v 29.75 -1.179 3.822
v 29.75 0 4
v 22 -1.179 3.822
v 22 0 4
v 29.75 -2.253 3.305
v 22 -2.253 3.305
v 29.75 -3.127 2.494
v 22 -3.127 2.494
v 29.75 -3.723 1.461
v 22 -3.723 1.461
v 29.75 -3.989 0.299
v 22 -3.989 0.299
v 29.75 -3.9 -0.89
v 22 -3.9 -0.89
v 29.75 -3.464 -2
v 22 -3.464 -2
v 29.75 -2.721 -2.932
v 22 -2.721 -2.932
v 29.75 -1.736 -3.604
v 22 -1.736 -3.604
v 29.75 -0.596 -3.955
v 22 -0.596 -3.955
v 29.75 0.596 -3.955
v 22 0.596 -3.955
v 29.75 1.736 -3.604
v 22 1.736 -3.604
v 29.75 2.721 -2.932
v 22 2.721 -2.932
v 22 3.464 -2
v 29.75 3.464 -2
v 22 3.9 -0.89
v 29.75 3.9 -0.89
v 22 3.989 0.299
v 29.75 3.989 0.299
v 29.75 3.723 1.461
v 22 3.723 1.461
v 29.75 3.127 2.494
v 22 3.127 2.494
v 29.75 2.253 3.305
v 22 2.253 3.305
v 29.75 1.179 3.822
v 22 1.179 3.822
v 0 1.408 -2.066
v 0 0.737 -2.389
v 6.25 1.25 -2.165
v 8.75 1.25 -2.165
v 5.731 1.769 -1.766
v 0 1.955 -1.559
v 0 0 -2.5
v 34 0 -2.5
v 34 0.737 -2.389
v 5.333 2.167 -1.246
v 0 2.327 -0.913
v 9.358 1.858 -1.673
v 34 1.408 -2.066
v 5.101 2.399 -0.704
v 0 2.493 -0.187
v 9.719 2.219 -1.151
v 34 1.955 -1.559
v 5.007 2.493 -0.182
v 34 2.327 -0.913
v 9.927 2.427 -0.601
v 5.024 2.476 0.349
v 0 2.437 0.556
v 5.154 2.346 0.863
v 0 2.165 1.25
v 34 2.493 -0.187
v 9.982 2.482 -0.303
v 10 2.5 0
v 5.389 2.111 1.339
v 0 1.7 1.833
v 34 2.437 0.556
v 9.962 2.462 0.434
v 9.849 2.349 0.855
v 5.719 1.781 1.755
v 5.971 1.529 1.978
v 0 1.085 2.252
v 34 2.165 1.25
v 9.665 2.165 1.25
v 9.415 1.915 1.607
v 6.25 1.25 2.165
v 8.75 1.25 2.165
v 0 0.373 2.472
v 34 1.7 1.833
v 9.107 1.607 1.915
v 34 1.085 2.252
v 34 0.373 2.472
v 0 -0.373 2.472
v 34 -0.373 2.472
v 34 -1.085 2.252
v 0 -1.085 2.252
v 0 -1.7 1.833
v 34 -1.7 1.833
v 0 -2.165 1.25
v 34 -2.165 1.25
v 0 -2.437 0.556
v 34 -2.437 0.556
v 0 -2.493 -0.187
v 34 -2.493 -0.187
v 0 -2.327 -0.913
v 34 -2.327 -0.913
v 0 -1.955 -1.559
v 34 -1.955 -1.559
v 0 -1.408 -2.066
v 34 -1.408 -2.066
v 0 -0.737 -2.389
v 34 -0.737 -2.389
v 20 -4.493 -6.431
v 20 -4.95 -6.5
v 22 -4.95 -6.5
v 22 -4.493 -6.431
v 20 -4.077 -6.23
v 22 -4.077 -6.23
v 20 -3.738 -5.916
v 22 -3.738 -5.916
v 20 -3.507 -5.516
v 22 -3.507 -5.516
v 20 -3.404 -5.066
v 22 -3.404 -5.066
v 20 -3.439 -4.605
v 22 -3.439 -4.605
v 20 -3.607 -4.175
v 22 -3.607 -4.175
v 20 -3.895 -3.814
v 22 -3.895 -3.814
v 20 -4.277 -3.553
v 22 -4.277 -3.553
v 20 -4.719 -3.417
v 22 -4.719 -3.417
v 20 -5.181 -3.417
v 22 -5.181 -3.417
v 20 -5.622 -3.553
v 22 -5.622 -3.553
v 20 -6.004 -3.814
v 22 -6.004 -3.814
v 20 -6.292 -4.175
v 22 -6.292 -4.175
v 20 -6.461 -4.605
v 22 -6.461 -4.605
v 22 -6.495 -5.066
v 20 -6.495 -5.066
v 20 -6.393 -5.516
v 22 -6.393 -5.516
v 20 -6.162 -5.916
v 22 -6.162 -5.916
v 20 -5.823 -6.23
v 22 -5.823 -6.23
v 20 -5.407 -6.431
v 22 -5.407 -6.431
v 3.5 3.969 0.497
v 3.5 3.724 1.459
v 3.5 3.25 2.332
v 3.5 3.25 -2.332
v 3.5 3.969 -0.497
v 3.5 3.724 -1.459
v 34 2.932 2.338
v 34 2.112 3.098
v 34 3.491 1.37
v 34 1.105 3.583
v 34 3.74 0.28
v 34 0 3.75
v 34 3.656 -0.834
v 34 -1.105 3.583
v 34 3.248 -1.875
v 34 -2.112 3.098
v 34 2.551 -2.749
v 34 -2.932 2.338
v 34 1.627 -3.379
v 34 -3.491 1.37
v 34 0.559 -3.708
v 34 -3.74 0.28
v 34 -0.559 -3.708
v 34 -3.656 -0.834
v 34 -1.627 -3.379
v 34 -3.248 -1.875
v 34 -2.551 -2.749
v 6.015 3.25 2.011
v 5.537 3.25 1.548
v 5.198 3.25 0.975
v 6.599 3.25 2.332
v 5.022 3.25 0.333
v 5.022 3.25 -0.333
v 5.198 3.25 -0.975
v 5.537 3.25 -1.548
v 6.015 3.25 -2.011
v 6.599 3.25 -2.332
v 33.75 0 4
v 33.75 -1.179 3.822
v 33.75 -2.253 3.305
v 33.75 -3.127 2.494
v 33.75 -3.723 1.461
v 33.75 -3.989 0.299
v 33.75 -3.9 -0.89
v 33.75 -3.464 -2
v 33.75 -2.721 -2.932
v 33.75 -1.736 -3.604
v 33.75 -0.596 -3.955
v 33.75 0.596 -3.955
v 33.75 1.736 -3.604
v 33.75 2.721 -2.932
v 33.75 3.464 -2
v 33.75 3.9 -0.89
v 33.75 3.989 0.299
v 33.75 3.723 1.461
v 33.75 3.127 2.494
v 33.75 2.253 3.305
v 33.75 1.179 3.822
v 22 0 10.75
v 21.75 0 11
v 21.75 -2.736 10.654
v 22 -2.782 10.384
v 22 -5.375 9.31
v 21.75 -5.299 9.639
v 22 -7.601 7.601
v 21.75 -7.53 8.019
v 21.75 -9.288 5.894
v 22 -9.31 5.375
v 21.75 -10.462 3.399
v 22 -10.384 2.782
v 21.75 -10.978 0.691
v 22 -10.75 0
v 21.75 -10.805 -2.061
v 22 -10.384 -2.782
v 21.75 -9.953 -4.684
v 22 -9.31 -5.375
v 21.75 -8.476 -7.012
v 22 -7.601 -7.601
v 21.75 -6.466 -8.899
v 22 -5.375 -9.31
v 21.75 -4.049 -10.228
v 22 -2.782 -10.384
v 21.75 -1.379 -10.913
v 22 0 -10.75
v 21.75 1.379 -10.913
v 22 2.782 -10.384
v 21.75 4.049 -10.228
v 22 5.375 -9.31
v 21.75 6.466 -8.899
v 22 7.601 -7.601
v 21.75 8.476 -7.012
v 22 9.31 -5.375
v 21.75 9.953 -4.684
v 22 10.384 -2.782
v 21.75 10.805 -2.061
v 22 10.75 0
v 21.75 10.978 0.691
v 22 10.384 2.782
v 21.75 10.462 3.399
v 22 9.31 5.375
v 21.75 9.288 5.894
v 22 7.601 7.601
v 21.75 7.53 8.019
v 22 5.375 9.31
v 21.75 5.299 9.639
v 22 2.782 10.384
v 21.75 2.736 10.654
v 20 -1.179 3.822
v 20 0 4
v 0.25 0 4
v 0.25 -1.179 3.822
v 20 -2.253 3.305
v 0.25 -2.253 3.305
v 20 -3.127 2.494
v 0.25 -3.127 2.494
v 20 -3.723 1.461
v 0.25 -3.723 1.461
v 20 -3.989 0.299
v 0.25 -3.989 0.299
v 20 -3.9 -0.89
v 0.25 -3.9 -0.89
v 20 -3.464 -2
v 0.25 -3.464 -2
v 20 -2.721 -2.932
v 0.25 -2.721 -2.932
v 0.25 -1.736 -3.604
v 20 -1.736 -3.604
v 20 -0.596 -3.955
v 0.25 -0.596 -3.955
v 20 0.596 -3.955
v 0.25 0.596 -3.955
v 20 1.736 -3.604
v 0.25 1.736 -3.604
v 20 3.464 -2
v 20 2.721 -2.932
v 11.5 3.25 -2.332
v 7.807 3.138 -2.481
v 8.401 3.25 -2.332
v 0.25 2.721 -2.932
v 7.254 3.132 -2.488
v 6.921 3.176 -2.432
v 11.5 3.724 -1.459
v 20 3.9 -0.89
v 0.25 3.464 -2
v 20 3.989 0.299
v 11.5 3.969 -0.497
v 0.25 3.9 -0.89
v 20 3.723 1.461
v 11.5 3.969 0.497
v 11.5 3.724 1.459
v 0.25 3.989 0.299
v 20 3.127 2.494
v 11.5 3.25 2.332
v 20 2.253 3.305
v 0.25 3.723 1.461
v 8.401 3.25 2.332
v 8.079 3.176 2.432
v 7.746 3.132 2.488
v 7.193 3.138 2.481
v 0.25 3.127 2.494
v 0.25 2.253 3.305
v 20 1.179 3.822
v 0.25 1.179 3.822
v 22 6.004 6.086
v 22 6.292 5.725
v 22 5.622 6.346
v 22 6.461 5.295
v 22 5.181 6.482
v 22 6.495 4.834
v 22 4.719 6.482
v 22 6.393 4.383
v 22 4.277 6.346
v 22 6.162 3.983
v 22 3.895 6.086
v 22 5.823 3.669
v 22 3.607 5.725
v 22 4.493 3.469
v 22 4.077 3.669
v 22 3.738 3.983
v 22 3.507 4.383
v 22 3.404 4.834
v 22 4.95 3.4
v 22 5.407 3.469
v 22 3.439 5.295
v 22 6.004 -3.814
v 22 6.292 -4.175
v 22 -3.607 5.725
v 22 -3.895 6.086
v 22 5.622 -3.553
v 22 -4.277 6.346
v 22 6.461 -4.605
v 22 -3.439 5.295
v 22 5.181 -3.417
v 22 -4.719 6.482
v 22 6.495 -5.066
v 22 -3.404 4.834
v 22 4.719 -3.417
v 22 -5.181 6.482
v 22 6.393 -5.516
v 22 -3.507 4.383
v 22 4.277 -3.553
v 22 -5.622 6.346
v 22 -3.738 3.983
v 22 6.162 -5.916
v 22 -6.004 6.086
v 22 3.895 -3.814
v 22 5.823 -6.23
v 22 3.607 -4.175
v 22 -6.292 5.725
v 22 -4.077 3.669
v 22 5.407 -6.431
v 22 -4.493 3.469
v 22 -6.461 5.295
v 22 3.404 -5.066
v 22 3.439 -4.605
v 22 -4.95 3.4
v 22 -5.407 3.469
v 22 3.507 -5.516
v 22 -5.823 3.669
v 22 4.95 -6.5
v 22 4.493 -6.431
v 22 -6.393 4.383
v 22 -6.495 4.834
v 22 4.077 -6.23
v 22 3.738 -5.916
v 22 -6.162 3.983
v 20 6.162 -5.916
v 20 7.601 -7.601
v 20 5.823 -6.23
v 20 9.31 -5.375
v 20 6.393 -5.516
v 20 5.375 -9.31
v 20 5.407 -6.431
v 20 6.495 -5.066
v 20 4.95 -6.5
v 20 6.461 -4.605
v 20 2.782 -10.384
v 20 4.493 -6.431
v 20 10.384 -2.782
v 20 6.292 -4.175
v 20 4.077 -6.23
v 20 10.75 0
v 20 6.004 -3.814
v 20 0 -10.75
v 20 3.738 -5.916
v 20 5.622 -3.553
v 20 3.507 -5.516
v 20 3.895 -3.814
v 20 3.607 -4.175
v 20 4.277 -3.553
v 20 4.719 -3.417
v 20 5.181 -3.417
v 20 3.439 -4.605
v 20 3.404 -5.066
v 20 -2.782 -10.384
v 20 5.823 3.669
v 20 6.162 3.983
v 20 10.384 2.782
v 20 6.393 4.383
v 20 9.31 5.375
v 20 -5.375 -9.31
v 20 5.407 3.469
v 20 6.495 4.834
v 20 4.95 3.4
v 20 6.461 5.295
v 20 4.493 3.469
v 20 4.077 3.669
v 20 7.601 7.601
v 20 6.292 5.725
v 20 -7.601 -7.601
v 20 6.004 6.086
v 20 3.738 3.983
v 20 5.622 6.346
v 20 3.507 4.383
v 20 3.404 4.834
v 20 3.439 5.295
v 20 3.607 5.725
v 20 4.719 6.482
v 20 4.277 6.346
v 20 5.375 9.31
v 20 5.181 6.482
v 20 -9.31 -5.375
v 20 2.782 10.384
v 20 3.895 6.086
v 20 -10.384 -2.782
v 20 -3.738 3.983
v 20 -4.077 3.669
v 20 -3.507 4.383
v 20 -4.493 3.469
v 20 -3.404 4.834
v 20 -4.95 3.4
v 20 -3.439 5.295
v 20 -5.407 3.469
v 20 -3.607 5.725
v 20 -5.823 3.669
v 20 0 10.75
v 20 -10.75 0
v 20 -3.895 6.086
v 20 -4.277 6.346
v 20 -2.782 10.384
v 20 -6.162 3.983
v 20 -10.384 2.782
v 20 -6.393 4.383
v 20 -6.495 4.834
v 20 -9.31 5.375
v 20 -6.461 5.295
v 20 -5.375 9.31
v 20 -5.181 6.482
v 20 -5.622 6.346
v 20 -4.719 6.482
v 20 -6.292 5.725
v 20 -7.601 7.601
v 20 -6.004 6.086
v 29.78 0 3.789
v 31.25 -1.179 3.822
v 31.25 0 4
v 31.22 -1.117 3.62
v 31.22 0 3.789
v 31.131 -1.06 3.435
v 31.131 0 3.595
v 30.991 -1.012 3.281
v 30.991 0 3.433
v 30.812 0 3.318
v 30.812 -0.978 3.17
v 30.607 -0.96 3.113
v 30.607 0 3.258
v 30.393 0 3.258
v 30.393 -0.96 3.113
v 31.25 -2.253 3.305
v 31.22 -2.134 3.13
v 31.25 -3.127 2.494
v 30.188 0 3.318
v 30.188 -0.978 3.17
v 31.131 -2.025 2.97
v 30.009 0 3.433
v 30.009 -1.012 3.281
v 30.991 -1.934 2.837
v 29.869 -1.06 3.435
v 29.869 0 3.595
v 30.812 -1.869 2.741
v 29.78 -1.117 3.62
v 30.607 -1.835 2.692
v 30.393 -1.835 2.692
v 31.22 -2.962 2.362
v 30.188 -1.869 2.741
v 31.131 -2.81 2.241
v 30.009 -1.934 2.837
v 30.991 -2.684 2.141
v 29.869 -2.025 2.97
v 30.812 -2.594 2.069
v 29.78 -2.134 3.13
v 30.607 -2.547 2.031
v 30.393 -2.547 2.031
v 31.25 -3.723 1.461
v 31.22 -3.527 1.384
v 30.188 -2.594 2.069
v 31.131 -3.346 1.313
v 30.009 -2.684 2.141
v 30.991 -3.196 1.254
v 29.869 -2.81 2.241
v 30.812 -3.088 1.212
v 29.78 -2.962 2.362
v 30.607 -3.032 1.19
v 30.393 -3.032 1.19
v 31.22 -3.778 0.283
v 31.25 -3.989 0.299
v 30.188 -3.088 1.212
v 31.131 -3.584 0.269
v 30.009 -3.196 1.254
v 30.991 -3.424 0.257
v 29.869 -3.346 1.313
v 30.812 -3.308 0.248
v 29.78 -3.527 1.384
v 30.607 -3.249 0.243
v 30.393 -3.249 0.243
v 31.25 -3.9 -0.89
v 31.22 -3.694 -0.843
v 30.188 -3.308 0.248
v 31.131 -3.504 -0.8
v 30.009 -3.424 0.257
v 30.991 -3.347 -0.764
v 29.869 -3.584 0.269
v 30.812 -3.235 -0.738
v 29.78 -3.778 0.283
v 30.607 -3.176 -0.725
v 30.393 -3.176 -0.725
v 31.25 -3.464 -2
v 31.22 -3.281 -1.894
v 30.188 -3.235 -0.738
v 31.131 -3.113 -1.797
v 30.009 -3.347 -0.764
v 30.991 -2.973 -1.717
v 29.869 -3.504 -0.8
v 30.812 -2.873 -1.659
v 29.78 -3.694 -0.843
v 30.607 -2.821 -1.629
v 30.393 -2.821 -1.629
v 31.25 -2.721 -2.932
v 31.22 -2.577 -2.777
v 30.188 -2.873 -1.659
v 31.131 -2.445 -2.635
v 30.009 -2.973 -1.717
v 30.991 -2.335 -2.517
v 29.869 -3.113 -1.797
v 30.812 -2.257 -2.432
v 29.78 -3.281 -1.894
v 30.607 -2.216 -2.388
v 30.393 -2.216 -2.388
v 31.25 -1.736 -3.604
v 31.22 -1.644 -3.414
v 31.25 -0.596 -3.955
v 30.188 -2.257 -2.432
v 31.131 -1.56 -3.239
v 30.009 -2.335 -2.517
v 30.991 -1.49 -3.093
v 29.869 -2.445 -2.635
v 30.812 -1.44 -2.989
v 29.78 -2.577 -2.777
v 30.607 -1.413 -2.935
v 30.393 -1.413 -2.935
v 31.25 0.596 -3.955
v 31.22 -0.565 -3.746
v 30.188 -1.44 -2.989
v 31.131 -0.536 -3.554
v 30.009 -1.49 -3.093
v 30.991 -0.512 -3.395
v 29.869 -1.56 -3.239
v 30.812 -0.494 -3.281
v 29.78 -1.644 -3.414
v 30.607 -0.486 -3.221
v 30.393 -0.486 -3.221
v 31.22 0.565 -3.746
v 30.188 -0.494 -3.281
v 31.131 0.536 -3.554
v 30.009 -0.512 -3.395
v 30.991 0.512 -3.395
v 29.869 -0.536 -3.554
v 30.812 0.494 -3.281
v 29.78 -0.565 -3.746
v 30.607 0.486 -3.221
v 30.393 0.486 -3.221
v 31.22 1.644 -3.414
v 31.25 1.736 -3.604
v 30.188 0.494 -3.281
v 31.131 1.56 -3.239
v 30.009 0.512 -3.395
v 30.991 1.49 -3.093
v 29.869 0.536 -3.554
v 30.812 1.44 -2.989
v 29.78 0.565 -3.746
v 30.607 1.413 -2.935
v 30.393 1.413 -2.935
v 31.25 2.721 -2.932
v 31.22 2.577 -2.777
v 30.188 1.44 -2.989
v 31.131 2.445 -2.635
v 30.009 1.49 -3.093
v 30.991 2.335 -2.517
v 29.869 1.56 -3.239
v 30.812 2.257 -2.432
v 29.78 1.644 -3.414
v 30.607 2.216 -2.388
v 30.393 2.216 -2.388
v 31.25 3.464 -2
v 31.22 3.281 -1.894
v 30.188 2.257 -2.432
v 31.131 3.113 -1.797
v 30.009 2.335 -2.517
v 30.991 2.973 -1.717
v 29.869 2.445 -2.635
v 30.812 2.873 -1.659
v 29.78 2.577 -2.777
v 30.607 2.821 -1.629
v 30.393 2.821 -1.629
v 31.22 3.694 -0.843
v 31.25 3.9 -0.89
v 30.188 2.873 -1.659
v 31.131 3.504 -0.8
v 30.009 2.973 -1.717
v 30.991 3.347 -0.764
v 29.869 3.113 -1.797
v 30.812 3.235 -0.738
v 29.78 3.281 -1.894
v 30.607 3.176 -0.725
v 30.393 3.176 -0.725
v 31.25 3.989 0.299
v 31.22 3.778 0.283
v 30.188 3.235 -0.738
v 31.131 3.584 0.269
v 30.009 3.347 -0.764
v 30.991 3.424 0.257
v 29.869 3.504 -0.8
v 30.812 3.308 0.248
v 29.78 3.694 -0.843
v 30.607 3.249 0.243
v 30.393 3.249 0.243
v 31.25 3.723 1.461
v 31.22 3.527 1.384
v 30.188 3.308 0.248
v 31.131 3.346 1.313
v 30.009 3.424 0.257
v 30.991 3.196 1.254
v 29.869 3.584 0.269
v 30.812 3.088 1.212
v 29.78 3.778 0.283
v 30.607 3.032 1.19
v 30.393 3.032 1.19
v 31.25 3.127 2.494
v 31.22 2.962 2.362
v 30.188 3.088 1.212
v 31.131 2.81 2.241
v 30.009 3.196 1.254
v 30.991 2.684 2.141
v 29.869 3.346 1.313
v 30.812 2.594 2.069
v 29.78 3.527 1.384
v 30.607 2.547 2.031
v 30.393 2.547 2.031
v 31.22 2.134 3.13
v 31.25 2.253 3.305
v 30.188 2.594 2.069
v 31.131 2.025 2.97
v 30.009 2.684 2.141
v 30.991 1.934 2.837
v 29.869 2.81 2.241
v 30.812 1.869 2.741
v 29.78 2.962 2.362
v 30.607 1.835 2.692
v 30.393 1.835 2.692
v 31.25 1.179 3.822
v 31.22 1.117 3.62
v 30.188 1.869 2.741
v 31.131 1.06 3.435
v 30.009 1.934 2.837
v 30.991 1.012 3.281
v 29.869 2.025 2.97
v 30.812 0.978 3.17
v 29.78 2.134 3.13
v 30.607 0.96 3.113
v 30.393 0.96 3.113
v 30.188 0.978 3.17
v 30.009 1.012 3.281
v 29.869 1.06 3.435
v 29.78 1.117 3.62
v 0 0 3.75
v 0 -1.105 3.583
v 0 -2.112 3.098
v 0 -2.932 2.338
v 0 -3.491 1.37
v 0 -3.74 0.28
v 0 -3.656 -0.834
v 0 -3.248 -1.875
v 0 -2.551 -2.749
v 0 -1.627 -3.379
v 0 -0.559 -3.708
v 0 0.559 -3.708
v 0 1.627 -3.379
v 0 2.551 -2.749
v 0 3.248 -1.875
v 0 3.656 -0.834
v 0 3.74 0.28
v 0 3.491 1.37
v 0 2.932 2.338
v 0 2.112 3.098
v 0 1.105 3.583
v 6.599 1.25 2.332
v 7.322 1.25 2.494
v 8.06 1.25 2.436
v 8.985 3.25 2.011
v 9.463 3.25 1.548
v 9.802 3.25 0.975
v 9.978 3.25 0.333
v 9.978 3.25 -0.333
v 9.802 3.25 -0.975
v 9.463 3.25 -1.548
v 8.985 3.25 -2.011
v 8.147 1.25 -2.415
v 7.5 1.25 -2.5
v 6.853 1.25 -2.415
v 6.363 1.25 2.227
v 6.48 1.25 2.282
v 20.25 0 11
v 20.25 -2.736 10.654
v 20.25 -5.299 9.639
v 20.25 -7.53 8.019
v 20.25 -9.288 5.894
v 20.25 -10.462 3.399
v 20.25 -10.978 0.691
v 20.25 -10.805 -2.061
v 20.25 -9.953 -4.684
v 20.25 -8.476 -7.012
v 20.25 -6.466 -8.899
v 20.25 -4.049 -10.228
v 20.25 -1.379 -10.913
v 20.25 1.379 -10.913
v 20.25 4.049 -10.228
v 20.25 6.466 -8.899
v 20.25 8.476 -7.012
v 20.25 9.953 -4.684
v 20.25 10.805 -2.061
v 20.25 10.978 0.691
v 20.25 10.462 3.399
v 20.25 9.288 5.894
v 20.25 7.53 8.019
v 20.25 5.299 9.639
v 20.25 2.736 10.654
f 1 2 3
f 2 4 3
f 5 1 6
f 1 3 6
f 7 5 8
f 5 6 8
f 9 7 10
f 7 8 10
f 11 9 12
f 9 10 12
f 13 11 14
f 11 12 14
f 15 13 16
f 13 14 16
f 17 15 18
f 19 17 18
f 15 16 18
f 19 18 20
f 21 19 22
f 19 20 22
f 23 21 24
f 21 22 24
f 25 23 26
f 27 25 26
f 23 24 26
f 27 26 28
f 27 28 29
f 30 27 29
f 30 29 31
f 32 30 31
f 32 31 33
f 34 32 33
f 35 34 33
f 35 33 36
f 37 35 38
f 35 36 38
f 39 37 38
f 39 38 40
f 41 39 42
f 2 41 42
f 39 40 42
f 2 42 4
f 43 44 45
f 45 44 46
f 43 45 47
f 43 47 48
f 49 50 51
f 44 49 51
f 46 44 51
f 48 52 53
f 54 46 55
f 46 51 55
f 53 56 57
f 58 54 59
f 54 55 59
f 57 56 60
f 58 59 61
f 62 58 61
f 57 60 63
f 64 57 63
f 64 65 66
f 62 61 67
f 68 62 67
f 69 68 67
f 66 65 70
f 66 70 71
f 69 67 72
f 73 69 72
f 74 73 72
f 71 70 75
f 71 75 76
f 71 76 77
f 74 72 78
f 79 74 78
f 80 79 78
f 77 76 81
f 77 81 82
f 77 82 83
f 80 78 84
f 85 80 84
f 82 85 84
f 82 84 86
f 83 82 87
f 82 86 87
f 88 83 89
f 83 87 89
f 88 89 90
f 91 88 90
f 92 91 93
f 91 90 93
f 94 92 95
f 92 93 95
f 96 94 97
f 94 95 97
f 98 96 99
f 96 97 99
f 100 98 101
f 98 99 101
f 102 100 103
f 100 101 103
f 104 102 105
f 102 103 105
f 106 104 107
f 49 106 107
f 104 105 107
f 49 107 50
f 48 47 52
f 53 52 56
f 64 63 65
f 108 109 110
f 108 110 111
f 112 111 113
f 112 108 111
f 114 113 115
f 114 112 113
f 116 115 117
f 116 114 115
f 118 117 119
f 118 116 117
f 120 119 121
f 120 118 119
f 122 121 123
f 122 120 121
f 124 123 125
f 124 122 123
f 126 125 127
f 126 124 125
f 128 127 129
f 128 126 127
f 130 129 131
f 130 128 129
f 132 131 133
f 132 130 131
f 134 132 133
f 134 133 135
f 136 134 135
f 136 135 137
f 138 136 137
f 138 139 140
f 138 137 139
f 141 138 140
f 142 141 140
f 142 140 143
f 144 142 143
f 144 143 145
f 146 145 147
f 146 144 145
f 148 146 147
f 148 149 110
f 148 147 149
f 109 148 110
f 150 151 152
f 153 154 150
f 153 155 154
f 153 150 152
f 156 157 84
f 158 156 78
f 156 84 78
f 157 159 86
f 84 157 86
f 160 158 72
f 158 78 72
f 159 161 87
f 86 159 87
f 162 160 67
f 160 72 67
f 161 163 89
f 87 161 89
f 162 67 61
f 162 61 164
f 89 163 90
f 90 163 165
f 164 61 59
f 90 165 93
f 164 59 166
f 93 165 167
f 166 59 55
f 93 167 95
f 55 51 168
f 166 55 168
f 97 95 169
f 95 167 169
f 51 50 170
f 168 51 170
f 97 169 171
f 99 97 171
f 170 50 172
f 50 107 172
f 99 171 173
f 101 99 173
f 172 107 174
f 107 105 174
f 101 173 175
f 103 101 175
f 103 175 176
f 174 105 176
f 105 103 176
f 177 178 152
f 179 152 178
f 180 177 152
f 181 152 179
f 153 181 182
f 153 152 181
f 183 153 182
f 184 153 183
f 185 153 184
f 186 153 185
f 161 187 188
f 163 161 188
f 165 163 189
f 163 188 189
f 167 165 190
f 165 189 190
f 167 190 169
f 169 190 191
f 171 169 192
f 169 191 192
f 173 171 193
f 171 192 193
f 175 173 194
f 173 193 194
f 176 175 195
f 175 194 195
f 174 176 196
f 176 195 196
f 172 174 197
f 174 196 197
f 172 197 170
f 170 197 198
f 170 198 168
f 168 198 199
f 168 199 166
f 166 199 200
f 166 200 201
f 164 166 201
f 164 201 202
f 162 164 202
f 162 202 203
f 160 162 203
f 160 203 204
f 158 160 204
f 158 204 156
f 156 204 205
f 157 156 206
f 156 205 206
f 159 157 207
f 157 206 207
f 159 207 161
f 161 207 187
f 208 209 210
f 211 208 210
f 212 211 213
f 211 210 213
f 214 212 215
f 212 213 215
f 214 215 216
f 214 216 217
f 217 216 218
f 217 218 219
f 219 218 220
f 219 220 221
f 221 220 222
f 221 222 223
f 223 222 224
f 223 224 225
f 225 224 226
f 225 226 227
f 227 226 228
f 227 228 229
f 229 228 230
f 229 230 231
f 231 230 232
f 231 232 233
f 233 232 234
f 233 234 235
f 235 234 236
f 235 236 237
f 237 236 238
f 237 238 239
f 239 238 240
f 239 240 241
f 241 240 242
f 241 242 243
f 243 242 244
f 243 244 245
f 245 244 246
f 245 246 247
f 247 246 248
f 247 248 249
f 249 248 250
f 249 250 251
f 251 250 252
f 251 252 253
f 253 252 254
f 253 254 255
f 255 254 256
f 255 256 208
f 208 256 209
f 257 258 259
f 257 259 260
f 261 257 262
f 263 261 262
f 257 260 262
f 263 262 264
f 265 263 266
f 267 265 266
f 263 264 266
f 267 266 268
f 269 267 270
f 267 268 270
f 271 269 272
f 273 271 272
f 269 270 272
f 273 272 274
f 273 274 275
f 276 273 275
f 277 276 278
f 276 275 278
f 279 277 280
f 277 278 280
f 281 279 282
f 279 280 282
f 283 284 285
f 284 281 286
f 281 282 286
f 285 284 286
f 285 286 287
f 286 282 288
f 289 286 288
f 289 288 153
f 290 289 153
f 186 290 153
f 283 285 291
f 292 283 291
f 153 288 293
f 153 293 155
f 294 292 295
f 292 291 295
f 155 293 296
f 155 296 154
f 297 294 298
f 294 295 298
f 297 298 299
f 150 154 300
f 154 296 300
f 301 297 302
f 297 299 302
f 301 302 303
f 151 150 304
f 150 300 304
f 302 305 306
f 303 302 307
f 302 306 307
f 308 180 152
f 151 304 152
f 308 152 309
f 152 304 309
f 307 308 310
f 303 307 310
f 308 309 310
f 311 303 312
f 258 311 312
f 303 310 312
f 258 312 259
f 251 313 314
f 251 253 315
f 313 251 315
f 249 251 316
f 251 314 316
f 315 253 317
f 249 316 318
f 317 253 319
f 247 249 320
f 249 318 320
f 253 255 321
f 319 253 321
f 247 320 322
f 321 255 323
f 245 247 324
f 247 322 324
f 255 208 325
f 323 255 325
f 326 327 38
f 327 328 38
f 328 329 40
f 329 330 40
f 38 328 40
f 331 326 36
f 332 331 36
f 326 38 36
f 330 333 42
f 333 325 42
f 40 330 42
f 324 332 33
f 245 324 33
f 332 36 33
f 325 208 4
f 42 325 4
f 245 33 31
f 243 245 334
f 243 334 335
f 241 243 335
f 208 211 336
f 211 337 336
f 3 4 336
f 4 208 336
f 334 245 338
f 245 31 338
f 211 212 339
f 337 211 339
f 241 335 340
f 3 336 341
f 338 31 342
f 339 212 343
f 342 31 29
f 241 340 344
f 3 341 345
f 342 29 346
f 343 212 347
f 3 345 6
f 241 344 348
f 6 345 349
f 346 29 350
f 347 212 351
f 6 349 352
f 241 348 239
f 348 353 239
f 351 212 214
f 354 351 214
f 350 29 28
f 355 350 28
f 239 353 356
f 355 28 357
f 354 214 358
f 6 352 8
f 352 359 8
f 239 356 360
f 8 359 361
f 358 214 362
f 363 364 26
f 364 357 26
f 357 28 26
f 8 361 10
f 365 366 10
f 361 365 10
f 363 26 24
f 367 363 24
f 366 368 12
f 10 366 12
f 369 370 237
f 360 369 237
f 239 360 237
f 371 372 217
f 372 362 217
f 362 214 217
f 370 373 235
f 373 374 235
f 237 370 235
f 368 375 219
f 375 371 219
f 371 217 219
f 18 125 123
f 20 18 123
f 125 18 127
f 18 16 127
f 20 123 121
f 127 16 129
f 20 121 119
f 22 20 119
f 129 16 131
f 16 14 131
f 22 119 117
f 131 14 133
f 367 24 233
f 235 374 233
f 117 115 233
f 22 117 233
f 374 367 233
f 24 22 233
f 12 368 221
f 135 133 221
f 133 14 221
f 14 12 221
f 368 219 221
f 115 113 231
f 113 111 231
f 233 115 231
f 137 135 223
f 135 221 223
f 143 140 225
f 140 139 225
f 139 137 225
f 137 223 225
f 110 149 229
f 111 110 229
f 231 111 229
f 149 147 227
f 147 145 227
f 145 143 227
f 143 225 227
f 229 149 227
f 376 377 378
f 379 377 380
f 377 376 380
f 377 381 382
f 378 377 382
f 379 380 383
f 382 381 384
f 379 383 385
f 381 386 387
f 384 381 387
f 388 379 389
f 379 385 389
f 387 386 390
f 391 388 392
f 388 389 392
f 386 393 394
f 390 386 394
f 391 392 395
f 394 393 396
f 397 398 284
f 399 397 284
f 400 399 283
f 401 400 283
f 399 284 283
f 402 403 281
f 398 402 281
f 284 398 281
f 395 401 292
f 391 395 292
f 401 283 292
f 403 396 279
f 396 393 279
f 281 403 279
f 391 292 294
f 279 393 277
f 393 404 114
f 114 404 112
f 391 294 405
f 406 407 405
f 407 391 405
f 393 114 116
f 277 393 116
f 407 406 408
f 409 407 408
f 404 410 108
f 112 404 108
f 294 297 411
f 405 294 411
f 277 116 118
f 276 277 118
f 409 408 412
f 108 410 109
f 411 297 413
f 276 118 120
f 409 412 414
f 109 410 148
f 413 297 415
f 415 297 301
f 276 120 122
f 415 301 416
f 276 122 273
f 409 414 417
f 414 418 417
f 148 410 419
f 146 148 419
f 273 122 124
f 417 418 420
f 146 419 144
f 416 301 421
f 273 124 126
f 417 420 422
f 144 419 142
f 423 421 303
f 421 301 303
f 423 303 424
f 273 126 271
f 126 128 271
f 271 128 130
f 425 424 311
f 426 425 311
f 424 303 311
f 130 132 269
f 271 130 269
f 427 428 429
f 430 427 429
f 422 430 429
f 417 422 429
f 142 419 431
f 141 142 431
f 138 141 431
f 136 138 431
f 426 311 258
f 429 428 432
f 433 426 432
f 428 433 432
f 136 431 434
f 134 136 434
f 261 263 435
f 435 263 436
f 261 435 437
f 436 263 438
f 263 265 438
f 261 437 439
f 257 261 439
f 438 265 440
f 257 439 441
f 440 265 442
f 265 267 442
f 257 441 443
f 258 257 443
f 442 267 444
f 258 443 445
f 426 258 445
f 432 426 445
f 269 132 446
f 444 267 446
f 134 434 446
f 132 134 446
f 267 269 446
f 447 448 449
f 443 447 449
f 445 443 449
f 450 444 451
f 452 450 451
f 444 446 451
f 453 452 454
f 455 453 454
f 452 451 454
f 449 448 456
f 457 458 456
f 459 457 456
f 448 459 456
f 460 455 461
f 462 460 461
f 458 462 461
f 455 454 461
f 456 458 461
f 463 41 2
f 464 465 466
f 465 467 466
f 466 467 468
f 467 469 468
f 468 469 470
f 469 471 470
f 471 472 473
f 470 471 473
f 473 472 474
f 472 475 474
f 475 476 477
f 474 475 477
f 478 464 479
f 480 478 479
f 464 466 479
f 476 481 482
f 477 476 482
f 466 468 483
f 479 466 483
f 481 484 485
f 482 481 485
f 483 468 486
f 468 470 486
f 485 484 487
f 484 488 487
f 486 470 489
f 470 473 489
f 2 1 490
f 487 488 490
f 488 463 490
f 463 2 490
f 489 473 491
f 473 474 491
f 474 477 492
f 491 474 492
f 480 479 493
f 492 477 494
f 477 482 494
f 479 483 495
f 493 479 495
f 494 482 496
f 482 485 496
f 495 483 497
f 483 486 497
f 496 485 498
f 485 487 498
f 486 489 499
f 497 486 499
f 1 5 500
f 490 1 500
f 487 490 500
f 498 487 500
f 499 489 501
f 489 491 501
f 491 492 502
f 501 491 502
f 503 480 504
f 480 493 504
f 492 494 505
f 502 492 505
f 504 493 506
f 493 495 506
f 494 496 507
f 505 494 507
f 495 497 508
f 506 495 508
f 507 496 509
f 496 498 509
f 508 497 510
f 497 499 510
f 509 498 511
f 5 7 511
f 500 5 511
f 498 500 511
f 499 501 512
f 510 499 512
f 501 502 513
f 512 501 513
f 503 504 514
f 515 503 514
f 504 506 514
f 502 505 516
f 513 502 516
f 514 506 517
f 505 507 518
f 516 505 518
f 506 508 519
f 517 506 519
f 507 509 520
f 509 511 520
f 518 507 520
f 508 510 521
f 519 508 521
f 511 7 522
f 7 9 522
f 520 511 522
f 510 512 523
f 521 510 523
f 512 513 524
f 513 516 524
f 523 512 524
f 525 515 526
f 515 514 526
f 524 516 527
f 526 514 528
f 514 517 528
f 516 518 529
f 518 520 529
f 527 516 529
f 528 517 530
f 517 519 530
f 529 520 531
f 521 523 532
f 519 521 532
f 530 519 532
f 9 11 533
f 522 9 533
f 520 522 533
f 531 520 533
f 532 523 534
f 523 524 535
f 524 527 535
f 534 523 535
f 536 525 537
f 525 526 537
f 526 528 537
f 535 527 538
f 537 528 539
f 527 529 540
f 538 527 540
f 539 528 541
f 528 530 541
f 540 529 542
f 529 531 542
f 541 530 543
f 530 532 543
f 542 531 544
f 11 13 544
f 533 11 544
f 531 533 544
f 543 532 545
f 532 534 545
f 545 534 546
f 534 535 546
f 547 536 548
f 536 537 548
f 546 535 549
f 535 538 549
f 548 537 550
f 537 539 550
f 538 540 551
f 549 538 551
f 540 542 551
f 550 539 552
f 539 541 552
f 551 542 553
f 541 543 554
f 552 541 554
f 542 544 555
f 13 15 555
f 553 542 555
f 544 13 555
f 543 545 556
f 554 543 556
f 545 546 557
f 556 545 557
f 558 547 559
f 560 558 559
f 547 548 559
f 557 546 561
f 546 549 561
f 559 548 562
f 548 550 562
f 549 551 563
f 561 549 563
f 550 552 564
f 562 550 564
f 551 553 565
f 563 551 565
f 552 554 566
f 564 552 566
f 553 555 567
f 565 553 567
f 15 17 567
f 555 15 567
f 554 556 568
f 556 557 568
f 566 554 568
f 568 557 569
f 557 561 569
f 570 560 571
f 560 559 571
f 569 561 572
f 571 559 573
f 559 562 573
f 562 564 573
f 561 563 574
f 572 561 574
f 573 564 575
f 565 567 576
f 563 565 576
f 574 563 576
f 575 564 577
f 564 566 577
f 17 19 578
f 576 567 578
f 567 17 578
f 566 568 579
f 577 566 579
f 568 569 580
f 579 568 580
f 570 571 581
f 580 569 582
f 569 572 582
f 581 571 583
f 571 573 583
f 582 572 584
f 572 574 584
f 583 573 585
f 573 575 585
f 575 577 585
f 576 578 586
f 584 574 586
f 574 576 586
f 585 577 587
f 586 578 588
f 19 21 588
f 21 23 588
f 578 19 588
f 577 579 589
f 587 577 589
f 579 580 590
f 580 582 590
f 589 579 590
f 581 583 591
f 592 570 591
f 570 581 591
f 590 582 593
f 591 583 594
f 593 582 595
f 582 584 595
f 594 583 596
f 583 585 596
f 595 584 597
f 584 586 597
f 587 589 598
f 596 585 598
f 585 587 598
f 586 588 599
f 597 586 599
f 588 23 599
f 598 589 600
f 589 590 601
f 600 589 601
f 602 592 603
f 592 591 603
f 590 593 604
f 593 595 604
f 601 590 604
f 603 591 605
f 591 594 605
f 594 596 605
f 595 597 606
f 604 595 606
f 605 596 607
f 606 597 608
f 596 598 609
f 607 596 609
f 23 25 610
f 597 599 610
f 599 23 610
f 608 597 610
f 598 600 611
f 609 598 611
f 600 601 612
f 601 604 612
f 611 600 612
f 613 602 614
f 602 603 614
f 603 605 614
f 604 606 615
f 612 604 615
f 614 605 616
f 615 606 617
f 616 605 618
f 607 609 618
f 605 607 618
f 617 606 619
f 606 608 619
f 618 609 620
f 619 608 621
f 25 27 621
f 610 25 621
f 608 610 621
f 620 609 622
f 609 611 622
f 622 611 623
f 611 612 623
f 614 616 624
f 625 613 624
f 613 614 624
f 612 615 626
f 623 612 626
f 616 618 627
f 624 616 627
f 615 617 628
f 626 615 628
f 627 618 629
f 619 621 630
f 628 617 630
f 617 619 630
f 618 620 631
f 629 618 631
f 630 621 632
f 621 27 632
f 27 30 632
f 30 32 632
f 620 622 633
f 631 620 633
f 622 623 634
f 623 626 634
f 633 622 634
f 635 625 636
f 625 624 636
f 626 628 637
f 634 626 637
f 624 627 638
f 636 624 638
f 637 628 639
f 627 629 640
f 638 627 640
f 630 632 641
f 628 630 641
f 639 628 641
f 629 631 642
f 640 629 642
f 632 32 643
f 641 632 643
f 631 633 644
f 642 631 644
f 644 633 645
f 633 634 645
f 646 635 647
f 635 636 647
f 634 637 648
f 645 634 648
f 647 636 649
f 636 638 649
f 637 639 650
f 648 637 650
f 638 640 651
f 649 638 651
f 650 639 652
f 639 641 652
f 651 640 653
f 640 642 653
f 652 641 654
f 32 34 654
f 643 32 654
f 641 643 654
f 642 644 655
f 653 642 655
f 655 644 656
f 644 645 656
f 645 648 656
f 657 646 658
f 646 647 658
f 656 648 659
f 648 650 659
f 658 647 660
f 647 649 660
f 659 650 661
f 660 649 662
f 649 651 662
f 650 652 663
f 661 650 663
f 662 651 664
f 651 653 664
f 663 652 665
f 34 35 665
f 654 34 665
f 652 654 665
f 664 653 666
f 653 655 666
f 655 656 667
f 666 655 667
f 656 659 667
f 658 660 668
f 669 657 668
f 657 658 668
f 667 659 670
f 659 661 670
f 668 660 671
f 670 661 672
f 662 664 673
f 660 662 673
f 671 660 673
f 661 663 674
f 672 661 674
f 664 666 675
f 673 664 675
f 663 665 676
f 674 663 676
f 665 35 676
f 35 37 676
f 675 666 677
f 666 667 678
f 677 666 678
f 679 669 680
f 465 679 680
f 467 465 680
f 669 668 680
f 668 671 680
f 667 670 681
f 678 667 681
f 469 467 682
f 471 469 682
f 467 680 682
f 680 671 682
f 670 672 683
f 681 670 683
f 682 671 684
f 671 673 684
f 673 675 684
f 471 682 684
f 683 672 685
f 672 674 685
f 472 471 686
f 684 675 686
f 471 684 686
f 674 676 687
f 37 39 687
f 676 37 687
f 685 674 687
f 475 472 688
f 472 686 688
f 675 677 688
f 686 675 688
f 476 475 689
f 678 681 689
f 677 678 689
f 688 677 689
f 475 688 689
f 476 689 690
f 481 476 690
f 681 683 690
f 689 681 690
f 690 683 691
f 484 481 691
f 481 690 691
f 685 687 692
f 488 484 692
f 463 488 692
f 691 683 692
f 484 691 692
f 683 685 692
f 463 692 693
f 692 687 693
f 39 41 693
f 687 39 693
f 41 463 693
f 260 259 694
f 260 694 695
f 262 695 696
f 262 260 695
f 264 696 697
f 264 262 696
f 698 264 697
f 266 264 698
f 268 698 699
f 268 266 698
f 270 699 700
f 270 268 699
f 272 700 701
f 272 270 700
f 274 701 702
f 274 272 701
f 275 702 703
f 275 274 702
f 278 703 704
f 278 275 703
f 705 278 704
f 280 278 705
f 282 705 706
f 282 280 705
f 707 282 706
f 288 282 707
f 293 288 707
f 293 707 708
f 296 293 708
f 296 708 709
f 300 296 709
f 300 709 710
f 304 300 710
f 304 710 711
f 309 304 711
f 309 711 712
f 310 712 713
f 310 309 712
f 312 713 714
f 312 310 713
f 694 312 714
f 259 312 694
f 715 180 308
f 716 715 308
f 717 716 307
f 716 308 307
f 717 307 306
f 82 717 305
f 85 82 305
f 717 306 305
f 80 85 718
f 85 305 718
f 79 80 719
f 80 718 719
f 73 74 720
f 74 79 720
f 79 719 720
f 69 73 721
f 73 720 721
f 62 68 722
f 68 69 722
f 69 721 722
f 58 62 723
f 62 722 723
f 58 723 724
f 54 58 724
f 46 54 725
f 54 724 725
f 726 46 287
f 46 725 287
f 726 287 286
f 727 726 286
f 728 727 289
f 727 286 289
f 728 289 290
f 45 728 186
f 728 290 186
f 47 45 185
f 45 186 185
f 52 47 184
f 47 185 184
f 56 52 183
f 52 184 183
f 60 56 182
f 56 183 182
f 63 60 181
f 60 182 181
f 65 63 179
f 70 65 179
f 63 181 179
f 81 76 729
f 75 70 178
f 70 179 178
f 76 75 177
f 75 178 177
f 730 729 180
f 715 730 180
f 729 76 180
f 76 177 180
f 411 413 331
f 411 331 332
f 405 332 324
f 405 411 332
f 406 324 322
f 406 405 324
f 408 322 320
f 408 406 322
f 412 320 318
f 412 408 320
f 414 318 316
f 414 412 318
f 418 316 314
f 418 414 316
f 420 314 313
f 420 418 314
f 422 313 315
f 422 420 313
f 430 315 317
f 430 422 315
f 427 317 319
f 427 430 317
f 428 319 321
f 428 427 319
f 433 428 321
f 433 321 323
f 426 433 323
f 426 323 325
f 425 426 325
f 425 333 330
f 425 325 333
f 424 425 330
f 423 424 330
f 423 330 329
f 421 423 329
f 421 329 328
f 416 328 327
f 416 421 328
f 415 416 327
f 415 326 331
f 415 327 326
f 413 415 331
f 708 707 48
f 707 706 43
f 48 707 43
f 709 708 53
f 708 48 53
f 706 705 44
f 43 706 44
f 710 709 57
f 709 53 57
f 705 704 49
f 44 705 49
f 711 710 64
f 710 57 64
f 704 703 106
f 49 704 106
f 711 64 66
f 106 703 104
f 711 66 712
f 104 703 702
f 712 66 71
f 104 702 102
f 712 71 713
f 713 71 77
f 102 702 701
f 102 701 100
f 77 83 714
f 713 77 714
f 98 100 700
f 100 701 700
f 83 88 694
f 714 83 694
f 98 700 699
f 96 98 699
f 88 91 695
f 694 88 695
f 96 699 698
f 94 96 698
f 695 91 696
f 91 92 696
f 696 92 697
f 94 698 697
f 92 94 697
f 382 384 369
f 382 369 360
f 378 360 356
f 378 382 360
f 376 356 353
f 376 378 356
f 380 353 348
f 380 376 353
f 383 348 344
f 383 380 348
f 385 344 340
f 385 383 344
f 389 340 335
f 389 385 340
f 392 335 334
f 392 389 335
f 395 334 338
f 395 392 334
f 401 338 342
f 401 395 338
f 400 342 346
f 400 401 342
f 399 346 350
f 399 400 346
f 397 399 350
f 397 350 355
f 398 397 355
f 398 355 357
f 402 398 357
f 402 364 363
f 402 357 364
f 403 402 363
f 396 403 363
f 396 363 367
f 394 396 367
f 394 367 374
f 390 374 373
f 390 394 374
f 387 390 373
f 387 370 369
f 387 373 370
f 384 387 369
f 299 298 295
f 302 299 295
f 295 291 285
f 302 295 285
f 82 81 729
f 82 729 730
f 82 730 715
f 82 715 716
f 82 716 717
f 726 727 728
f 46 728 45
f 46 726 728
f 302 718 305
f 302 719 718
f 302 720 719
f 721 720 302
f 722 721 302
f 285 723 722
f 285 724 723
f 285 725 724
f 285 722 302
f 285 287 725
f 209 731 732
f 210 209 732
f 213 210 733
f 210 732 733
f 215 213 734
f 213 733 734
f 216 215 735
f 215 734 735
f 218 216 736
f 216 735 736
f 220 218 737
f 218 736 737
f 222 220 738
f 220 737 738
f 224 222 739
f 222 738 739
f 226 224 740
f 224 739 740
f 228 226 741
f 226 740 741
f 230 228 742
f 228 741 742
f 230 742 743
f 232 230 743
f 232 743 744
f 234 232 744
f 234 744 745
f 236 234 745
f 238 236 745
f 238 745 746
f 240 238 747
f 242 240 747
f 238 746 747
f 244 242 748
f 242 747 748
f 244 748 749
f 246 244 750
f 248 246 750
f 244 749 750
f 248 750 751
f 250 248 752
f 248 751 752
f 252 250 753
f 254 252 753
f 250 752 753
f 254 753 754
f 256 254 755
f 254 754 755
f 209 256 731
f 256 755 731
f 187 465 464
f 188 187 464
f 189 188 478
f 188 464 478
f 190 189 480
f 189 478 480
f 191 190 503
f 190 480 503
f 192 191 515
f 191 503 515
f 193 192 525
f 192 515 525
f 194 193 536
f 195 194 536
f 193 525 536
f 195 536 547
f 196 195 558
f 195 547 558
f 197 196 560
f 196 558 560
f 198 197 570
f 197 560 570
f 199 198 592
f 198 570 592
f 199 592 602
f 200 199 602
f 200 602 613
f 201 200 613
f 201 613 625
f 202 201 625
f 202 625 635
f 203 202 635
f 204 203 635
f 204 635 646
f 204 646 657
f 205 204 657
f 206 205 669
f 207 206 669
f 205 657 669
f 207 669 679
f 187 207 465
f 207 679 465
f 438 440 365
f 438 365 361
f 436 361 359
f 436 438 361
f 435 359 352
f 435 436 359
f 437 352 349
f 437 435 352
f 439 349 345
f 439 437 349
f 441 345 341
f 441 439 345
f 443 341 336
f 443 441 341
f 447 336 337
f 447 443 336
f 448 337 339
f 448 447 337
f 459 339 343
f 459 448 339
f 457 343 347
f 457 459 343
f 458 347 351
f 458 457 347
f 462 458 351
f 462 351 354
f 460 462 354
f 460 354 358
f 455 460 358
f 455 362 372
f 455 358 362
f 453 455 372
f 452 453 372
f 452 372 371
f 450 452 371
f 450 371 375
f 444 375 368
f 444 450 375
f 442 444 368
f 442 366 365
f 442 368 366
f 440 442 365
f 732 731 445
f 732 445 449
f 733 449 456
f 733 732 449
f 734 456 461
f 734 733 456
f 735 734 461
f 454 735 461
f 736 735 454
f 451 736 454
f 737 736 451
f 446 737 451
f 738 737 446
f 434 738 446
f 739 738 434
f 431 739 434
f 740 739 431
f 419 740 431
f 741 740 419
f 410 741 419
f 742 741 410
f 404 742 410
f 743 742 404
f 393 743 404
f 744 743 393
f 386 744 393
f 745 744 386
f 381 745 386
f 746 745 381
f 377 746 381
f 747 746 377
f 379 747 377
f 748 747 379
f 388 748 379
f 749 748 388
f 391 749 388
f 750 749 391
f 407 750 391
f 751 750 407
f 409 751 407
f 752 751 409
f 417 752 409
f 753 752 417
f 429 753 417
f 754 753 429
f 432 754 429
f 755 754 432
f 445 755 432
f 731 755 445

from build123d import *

# Parameters (mm, degrees)
SKETCH2_R               = 2.5
CUT_EXTRUDE1_DEPTH      = 38.389838192
CUT_EXTRUDE2_DEPTH      = 27.944387171
CUT_EXTRUDE2_DEPTH_BACK = 27.944387171
SKETCH3_R               = 1.55
SKETCH4_W               = 8
SKETCH4_H               = 5
CUT_EXTRUDE3_DEPTH      = 0.75
SKETCH5_R               = 2.5
CUT_EXTRUDE4_DEPTH      = 2
CHAMFER1_SIZE           = 0.25


with BuildPart() as part:
    # Sketch1 → Revolve1 (revolve)
    with BuildSketch(Plane.XY, mode=Mode.PRIVATE) as revolve1_sk:
        with BuildLine():
            Line((34, 0), (34, 4))
            Line((34, 4), (31.25, 4))
            ThreePointArc((31.25, 4), (30.5, 3.25), (29.75, 4))
            Line((29.75, 4), (22, 4))
            Line((22, 4), (22, 11))
            Line((22, 11), (20, 11))
            Line((20, 11), (20, 4))
            Line((20, 4), (0, 4))
            Line((0, 4), (0, 0))
            Line((0, 0), (34, 0))
        make_face()
    revolve(revolve1_sk.sketch.rotate(Axis((0, 0, 0), (1, 0, 0)), 90), axis=Axis((0, 0, 0), (1, 0, 0)))

    # Sketch2 → Cut-Extrude1 (cut, through all)
    with BuildSketch(Plane(origin=(34, 0, 0), x_dir=(0, 0, -1), z_dir=(1, 0, 0))):
        Circle(SKETCH2_R)
    extrude(amount=-CUT_EXTRUDE1_DEPTH, mode=Mode.SUBTRACT)

    # Sketch3 → Cut-Extrude2 (cut, two sides: drawn at the far end of the back side and taken through both)
    with BuildSketch(Plane(origin=(22, 0, 0), x_dir=(0, 0, -1), z_dir=(1, 0, 0)).offset(-CUT_EXTRUDE2_DEPTH_BACK)):
        with Locations((4.949747468, 4.949747468)):
            Circle(SKETCH3_R)
        with Locations((4.949747468, -4.949747468)):
            Circle(SKETCH3_R)
        with Locations((-4.949747468, -4.949747468)):
            Circle(SKETCH3_R)
        with Locations((-4.949747468, 4.949747468)):
            Circle(SKETCH3_R)
    extrude(amount=CUT_EXTRUDE2_DEPTH + CUT_EXTRUDE2_DEPTH_BACK, mode=Mode.SUBTRACT)

    # Sketch4 → Cut-Extrude3 (cut)
    with BuildSketch(Plane(origin=(0, 4, 0), x_dir=(1, 0, 0), z_dir=(0, 1, 0))):
        with Locations((7.5, 0)):
            Rectangle(SKETCH4_W, SKETCH4_H)
    extrude(amount=-CUT_EXTRUDE3_DEPTH, mode=Mode.SUBTRACT)

    # Sketch5 → Cut-Extrude4 (cut)
    with BuildSketch(Plane(origin=(0, 3.25, 0), x_dir=(1, 0, 0), z_dir=(0, 1, 0))):
        with Locations(Location((7.5, 0, 0), (0, 0, 248.865707785))):
            Circle(SKETCH5_R)
    extrude(amount=-CUT_EXTRUDE4_DEPTH, mode=Mode.SUBTRACT)

    # Chamfer1
    chamfer1_edges = [part.edges().sort_by_distance(p)[0] for p in [
        (22, 0, -11),
        (20, 0, -11),
        (0, 0, -4),
        (34, 0, -4),
    ]]
    chamfer(chamfer1_edges, length=CHAMFER1_SIZE)


solid = part.part
